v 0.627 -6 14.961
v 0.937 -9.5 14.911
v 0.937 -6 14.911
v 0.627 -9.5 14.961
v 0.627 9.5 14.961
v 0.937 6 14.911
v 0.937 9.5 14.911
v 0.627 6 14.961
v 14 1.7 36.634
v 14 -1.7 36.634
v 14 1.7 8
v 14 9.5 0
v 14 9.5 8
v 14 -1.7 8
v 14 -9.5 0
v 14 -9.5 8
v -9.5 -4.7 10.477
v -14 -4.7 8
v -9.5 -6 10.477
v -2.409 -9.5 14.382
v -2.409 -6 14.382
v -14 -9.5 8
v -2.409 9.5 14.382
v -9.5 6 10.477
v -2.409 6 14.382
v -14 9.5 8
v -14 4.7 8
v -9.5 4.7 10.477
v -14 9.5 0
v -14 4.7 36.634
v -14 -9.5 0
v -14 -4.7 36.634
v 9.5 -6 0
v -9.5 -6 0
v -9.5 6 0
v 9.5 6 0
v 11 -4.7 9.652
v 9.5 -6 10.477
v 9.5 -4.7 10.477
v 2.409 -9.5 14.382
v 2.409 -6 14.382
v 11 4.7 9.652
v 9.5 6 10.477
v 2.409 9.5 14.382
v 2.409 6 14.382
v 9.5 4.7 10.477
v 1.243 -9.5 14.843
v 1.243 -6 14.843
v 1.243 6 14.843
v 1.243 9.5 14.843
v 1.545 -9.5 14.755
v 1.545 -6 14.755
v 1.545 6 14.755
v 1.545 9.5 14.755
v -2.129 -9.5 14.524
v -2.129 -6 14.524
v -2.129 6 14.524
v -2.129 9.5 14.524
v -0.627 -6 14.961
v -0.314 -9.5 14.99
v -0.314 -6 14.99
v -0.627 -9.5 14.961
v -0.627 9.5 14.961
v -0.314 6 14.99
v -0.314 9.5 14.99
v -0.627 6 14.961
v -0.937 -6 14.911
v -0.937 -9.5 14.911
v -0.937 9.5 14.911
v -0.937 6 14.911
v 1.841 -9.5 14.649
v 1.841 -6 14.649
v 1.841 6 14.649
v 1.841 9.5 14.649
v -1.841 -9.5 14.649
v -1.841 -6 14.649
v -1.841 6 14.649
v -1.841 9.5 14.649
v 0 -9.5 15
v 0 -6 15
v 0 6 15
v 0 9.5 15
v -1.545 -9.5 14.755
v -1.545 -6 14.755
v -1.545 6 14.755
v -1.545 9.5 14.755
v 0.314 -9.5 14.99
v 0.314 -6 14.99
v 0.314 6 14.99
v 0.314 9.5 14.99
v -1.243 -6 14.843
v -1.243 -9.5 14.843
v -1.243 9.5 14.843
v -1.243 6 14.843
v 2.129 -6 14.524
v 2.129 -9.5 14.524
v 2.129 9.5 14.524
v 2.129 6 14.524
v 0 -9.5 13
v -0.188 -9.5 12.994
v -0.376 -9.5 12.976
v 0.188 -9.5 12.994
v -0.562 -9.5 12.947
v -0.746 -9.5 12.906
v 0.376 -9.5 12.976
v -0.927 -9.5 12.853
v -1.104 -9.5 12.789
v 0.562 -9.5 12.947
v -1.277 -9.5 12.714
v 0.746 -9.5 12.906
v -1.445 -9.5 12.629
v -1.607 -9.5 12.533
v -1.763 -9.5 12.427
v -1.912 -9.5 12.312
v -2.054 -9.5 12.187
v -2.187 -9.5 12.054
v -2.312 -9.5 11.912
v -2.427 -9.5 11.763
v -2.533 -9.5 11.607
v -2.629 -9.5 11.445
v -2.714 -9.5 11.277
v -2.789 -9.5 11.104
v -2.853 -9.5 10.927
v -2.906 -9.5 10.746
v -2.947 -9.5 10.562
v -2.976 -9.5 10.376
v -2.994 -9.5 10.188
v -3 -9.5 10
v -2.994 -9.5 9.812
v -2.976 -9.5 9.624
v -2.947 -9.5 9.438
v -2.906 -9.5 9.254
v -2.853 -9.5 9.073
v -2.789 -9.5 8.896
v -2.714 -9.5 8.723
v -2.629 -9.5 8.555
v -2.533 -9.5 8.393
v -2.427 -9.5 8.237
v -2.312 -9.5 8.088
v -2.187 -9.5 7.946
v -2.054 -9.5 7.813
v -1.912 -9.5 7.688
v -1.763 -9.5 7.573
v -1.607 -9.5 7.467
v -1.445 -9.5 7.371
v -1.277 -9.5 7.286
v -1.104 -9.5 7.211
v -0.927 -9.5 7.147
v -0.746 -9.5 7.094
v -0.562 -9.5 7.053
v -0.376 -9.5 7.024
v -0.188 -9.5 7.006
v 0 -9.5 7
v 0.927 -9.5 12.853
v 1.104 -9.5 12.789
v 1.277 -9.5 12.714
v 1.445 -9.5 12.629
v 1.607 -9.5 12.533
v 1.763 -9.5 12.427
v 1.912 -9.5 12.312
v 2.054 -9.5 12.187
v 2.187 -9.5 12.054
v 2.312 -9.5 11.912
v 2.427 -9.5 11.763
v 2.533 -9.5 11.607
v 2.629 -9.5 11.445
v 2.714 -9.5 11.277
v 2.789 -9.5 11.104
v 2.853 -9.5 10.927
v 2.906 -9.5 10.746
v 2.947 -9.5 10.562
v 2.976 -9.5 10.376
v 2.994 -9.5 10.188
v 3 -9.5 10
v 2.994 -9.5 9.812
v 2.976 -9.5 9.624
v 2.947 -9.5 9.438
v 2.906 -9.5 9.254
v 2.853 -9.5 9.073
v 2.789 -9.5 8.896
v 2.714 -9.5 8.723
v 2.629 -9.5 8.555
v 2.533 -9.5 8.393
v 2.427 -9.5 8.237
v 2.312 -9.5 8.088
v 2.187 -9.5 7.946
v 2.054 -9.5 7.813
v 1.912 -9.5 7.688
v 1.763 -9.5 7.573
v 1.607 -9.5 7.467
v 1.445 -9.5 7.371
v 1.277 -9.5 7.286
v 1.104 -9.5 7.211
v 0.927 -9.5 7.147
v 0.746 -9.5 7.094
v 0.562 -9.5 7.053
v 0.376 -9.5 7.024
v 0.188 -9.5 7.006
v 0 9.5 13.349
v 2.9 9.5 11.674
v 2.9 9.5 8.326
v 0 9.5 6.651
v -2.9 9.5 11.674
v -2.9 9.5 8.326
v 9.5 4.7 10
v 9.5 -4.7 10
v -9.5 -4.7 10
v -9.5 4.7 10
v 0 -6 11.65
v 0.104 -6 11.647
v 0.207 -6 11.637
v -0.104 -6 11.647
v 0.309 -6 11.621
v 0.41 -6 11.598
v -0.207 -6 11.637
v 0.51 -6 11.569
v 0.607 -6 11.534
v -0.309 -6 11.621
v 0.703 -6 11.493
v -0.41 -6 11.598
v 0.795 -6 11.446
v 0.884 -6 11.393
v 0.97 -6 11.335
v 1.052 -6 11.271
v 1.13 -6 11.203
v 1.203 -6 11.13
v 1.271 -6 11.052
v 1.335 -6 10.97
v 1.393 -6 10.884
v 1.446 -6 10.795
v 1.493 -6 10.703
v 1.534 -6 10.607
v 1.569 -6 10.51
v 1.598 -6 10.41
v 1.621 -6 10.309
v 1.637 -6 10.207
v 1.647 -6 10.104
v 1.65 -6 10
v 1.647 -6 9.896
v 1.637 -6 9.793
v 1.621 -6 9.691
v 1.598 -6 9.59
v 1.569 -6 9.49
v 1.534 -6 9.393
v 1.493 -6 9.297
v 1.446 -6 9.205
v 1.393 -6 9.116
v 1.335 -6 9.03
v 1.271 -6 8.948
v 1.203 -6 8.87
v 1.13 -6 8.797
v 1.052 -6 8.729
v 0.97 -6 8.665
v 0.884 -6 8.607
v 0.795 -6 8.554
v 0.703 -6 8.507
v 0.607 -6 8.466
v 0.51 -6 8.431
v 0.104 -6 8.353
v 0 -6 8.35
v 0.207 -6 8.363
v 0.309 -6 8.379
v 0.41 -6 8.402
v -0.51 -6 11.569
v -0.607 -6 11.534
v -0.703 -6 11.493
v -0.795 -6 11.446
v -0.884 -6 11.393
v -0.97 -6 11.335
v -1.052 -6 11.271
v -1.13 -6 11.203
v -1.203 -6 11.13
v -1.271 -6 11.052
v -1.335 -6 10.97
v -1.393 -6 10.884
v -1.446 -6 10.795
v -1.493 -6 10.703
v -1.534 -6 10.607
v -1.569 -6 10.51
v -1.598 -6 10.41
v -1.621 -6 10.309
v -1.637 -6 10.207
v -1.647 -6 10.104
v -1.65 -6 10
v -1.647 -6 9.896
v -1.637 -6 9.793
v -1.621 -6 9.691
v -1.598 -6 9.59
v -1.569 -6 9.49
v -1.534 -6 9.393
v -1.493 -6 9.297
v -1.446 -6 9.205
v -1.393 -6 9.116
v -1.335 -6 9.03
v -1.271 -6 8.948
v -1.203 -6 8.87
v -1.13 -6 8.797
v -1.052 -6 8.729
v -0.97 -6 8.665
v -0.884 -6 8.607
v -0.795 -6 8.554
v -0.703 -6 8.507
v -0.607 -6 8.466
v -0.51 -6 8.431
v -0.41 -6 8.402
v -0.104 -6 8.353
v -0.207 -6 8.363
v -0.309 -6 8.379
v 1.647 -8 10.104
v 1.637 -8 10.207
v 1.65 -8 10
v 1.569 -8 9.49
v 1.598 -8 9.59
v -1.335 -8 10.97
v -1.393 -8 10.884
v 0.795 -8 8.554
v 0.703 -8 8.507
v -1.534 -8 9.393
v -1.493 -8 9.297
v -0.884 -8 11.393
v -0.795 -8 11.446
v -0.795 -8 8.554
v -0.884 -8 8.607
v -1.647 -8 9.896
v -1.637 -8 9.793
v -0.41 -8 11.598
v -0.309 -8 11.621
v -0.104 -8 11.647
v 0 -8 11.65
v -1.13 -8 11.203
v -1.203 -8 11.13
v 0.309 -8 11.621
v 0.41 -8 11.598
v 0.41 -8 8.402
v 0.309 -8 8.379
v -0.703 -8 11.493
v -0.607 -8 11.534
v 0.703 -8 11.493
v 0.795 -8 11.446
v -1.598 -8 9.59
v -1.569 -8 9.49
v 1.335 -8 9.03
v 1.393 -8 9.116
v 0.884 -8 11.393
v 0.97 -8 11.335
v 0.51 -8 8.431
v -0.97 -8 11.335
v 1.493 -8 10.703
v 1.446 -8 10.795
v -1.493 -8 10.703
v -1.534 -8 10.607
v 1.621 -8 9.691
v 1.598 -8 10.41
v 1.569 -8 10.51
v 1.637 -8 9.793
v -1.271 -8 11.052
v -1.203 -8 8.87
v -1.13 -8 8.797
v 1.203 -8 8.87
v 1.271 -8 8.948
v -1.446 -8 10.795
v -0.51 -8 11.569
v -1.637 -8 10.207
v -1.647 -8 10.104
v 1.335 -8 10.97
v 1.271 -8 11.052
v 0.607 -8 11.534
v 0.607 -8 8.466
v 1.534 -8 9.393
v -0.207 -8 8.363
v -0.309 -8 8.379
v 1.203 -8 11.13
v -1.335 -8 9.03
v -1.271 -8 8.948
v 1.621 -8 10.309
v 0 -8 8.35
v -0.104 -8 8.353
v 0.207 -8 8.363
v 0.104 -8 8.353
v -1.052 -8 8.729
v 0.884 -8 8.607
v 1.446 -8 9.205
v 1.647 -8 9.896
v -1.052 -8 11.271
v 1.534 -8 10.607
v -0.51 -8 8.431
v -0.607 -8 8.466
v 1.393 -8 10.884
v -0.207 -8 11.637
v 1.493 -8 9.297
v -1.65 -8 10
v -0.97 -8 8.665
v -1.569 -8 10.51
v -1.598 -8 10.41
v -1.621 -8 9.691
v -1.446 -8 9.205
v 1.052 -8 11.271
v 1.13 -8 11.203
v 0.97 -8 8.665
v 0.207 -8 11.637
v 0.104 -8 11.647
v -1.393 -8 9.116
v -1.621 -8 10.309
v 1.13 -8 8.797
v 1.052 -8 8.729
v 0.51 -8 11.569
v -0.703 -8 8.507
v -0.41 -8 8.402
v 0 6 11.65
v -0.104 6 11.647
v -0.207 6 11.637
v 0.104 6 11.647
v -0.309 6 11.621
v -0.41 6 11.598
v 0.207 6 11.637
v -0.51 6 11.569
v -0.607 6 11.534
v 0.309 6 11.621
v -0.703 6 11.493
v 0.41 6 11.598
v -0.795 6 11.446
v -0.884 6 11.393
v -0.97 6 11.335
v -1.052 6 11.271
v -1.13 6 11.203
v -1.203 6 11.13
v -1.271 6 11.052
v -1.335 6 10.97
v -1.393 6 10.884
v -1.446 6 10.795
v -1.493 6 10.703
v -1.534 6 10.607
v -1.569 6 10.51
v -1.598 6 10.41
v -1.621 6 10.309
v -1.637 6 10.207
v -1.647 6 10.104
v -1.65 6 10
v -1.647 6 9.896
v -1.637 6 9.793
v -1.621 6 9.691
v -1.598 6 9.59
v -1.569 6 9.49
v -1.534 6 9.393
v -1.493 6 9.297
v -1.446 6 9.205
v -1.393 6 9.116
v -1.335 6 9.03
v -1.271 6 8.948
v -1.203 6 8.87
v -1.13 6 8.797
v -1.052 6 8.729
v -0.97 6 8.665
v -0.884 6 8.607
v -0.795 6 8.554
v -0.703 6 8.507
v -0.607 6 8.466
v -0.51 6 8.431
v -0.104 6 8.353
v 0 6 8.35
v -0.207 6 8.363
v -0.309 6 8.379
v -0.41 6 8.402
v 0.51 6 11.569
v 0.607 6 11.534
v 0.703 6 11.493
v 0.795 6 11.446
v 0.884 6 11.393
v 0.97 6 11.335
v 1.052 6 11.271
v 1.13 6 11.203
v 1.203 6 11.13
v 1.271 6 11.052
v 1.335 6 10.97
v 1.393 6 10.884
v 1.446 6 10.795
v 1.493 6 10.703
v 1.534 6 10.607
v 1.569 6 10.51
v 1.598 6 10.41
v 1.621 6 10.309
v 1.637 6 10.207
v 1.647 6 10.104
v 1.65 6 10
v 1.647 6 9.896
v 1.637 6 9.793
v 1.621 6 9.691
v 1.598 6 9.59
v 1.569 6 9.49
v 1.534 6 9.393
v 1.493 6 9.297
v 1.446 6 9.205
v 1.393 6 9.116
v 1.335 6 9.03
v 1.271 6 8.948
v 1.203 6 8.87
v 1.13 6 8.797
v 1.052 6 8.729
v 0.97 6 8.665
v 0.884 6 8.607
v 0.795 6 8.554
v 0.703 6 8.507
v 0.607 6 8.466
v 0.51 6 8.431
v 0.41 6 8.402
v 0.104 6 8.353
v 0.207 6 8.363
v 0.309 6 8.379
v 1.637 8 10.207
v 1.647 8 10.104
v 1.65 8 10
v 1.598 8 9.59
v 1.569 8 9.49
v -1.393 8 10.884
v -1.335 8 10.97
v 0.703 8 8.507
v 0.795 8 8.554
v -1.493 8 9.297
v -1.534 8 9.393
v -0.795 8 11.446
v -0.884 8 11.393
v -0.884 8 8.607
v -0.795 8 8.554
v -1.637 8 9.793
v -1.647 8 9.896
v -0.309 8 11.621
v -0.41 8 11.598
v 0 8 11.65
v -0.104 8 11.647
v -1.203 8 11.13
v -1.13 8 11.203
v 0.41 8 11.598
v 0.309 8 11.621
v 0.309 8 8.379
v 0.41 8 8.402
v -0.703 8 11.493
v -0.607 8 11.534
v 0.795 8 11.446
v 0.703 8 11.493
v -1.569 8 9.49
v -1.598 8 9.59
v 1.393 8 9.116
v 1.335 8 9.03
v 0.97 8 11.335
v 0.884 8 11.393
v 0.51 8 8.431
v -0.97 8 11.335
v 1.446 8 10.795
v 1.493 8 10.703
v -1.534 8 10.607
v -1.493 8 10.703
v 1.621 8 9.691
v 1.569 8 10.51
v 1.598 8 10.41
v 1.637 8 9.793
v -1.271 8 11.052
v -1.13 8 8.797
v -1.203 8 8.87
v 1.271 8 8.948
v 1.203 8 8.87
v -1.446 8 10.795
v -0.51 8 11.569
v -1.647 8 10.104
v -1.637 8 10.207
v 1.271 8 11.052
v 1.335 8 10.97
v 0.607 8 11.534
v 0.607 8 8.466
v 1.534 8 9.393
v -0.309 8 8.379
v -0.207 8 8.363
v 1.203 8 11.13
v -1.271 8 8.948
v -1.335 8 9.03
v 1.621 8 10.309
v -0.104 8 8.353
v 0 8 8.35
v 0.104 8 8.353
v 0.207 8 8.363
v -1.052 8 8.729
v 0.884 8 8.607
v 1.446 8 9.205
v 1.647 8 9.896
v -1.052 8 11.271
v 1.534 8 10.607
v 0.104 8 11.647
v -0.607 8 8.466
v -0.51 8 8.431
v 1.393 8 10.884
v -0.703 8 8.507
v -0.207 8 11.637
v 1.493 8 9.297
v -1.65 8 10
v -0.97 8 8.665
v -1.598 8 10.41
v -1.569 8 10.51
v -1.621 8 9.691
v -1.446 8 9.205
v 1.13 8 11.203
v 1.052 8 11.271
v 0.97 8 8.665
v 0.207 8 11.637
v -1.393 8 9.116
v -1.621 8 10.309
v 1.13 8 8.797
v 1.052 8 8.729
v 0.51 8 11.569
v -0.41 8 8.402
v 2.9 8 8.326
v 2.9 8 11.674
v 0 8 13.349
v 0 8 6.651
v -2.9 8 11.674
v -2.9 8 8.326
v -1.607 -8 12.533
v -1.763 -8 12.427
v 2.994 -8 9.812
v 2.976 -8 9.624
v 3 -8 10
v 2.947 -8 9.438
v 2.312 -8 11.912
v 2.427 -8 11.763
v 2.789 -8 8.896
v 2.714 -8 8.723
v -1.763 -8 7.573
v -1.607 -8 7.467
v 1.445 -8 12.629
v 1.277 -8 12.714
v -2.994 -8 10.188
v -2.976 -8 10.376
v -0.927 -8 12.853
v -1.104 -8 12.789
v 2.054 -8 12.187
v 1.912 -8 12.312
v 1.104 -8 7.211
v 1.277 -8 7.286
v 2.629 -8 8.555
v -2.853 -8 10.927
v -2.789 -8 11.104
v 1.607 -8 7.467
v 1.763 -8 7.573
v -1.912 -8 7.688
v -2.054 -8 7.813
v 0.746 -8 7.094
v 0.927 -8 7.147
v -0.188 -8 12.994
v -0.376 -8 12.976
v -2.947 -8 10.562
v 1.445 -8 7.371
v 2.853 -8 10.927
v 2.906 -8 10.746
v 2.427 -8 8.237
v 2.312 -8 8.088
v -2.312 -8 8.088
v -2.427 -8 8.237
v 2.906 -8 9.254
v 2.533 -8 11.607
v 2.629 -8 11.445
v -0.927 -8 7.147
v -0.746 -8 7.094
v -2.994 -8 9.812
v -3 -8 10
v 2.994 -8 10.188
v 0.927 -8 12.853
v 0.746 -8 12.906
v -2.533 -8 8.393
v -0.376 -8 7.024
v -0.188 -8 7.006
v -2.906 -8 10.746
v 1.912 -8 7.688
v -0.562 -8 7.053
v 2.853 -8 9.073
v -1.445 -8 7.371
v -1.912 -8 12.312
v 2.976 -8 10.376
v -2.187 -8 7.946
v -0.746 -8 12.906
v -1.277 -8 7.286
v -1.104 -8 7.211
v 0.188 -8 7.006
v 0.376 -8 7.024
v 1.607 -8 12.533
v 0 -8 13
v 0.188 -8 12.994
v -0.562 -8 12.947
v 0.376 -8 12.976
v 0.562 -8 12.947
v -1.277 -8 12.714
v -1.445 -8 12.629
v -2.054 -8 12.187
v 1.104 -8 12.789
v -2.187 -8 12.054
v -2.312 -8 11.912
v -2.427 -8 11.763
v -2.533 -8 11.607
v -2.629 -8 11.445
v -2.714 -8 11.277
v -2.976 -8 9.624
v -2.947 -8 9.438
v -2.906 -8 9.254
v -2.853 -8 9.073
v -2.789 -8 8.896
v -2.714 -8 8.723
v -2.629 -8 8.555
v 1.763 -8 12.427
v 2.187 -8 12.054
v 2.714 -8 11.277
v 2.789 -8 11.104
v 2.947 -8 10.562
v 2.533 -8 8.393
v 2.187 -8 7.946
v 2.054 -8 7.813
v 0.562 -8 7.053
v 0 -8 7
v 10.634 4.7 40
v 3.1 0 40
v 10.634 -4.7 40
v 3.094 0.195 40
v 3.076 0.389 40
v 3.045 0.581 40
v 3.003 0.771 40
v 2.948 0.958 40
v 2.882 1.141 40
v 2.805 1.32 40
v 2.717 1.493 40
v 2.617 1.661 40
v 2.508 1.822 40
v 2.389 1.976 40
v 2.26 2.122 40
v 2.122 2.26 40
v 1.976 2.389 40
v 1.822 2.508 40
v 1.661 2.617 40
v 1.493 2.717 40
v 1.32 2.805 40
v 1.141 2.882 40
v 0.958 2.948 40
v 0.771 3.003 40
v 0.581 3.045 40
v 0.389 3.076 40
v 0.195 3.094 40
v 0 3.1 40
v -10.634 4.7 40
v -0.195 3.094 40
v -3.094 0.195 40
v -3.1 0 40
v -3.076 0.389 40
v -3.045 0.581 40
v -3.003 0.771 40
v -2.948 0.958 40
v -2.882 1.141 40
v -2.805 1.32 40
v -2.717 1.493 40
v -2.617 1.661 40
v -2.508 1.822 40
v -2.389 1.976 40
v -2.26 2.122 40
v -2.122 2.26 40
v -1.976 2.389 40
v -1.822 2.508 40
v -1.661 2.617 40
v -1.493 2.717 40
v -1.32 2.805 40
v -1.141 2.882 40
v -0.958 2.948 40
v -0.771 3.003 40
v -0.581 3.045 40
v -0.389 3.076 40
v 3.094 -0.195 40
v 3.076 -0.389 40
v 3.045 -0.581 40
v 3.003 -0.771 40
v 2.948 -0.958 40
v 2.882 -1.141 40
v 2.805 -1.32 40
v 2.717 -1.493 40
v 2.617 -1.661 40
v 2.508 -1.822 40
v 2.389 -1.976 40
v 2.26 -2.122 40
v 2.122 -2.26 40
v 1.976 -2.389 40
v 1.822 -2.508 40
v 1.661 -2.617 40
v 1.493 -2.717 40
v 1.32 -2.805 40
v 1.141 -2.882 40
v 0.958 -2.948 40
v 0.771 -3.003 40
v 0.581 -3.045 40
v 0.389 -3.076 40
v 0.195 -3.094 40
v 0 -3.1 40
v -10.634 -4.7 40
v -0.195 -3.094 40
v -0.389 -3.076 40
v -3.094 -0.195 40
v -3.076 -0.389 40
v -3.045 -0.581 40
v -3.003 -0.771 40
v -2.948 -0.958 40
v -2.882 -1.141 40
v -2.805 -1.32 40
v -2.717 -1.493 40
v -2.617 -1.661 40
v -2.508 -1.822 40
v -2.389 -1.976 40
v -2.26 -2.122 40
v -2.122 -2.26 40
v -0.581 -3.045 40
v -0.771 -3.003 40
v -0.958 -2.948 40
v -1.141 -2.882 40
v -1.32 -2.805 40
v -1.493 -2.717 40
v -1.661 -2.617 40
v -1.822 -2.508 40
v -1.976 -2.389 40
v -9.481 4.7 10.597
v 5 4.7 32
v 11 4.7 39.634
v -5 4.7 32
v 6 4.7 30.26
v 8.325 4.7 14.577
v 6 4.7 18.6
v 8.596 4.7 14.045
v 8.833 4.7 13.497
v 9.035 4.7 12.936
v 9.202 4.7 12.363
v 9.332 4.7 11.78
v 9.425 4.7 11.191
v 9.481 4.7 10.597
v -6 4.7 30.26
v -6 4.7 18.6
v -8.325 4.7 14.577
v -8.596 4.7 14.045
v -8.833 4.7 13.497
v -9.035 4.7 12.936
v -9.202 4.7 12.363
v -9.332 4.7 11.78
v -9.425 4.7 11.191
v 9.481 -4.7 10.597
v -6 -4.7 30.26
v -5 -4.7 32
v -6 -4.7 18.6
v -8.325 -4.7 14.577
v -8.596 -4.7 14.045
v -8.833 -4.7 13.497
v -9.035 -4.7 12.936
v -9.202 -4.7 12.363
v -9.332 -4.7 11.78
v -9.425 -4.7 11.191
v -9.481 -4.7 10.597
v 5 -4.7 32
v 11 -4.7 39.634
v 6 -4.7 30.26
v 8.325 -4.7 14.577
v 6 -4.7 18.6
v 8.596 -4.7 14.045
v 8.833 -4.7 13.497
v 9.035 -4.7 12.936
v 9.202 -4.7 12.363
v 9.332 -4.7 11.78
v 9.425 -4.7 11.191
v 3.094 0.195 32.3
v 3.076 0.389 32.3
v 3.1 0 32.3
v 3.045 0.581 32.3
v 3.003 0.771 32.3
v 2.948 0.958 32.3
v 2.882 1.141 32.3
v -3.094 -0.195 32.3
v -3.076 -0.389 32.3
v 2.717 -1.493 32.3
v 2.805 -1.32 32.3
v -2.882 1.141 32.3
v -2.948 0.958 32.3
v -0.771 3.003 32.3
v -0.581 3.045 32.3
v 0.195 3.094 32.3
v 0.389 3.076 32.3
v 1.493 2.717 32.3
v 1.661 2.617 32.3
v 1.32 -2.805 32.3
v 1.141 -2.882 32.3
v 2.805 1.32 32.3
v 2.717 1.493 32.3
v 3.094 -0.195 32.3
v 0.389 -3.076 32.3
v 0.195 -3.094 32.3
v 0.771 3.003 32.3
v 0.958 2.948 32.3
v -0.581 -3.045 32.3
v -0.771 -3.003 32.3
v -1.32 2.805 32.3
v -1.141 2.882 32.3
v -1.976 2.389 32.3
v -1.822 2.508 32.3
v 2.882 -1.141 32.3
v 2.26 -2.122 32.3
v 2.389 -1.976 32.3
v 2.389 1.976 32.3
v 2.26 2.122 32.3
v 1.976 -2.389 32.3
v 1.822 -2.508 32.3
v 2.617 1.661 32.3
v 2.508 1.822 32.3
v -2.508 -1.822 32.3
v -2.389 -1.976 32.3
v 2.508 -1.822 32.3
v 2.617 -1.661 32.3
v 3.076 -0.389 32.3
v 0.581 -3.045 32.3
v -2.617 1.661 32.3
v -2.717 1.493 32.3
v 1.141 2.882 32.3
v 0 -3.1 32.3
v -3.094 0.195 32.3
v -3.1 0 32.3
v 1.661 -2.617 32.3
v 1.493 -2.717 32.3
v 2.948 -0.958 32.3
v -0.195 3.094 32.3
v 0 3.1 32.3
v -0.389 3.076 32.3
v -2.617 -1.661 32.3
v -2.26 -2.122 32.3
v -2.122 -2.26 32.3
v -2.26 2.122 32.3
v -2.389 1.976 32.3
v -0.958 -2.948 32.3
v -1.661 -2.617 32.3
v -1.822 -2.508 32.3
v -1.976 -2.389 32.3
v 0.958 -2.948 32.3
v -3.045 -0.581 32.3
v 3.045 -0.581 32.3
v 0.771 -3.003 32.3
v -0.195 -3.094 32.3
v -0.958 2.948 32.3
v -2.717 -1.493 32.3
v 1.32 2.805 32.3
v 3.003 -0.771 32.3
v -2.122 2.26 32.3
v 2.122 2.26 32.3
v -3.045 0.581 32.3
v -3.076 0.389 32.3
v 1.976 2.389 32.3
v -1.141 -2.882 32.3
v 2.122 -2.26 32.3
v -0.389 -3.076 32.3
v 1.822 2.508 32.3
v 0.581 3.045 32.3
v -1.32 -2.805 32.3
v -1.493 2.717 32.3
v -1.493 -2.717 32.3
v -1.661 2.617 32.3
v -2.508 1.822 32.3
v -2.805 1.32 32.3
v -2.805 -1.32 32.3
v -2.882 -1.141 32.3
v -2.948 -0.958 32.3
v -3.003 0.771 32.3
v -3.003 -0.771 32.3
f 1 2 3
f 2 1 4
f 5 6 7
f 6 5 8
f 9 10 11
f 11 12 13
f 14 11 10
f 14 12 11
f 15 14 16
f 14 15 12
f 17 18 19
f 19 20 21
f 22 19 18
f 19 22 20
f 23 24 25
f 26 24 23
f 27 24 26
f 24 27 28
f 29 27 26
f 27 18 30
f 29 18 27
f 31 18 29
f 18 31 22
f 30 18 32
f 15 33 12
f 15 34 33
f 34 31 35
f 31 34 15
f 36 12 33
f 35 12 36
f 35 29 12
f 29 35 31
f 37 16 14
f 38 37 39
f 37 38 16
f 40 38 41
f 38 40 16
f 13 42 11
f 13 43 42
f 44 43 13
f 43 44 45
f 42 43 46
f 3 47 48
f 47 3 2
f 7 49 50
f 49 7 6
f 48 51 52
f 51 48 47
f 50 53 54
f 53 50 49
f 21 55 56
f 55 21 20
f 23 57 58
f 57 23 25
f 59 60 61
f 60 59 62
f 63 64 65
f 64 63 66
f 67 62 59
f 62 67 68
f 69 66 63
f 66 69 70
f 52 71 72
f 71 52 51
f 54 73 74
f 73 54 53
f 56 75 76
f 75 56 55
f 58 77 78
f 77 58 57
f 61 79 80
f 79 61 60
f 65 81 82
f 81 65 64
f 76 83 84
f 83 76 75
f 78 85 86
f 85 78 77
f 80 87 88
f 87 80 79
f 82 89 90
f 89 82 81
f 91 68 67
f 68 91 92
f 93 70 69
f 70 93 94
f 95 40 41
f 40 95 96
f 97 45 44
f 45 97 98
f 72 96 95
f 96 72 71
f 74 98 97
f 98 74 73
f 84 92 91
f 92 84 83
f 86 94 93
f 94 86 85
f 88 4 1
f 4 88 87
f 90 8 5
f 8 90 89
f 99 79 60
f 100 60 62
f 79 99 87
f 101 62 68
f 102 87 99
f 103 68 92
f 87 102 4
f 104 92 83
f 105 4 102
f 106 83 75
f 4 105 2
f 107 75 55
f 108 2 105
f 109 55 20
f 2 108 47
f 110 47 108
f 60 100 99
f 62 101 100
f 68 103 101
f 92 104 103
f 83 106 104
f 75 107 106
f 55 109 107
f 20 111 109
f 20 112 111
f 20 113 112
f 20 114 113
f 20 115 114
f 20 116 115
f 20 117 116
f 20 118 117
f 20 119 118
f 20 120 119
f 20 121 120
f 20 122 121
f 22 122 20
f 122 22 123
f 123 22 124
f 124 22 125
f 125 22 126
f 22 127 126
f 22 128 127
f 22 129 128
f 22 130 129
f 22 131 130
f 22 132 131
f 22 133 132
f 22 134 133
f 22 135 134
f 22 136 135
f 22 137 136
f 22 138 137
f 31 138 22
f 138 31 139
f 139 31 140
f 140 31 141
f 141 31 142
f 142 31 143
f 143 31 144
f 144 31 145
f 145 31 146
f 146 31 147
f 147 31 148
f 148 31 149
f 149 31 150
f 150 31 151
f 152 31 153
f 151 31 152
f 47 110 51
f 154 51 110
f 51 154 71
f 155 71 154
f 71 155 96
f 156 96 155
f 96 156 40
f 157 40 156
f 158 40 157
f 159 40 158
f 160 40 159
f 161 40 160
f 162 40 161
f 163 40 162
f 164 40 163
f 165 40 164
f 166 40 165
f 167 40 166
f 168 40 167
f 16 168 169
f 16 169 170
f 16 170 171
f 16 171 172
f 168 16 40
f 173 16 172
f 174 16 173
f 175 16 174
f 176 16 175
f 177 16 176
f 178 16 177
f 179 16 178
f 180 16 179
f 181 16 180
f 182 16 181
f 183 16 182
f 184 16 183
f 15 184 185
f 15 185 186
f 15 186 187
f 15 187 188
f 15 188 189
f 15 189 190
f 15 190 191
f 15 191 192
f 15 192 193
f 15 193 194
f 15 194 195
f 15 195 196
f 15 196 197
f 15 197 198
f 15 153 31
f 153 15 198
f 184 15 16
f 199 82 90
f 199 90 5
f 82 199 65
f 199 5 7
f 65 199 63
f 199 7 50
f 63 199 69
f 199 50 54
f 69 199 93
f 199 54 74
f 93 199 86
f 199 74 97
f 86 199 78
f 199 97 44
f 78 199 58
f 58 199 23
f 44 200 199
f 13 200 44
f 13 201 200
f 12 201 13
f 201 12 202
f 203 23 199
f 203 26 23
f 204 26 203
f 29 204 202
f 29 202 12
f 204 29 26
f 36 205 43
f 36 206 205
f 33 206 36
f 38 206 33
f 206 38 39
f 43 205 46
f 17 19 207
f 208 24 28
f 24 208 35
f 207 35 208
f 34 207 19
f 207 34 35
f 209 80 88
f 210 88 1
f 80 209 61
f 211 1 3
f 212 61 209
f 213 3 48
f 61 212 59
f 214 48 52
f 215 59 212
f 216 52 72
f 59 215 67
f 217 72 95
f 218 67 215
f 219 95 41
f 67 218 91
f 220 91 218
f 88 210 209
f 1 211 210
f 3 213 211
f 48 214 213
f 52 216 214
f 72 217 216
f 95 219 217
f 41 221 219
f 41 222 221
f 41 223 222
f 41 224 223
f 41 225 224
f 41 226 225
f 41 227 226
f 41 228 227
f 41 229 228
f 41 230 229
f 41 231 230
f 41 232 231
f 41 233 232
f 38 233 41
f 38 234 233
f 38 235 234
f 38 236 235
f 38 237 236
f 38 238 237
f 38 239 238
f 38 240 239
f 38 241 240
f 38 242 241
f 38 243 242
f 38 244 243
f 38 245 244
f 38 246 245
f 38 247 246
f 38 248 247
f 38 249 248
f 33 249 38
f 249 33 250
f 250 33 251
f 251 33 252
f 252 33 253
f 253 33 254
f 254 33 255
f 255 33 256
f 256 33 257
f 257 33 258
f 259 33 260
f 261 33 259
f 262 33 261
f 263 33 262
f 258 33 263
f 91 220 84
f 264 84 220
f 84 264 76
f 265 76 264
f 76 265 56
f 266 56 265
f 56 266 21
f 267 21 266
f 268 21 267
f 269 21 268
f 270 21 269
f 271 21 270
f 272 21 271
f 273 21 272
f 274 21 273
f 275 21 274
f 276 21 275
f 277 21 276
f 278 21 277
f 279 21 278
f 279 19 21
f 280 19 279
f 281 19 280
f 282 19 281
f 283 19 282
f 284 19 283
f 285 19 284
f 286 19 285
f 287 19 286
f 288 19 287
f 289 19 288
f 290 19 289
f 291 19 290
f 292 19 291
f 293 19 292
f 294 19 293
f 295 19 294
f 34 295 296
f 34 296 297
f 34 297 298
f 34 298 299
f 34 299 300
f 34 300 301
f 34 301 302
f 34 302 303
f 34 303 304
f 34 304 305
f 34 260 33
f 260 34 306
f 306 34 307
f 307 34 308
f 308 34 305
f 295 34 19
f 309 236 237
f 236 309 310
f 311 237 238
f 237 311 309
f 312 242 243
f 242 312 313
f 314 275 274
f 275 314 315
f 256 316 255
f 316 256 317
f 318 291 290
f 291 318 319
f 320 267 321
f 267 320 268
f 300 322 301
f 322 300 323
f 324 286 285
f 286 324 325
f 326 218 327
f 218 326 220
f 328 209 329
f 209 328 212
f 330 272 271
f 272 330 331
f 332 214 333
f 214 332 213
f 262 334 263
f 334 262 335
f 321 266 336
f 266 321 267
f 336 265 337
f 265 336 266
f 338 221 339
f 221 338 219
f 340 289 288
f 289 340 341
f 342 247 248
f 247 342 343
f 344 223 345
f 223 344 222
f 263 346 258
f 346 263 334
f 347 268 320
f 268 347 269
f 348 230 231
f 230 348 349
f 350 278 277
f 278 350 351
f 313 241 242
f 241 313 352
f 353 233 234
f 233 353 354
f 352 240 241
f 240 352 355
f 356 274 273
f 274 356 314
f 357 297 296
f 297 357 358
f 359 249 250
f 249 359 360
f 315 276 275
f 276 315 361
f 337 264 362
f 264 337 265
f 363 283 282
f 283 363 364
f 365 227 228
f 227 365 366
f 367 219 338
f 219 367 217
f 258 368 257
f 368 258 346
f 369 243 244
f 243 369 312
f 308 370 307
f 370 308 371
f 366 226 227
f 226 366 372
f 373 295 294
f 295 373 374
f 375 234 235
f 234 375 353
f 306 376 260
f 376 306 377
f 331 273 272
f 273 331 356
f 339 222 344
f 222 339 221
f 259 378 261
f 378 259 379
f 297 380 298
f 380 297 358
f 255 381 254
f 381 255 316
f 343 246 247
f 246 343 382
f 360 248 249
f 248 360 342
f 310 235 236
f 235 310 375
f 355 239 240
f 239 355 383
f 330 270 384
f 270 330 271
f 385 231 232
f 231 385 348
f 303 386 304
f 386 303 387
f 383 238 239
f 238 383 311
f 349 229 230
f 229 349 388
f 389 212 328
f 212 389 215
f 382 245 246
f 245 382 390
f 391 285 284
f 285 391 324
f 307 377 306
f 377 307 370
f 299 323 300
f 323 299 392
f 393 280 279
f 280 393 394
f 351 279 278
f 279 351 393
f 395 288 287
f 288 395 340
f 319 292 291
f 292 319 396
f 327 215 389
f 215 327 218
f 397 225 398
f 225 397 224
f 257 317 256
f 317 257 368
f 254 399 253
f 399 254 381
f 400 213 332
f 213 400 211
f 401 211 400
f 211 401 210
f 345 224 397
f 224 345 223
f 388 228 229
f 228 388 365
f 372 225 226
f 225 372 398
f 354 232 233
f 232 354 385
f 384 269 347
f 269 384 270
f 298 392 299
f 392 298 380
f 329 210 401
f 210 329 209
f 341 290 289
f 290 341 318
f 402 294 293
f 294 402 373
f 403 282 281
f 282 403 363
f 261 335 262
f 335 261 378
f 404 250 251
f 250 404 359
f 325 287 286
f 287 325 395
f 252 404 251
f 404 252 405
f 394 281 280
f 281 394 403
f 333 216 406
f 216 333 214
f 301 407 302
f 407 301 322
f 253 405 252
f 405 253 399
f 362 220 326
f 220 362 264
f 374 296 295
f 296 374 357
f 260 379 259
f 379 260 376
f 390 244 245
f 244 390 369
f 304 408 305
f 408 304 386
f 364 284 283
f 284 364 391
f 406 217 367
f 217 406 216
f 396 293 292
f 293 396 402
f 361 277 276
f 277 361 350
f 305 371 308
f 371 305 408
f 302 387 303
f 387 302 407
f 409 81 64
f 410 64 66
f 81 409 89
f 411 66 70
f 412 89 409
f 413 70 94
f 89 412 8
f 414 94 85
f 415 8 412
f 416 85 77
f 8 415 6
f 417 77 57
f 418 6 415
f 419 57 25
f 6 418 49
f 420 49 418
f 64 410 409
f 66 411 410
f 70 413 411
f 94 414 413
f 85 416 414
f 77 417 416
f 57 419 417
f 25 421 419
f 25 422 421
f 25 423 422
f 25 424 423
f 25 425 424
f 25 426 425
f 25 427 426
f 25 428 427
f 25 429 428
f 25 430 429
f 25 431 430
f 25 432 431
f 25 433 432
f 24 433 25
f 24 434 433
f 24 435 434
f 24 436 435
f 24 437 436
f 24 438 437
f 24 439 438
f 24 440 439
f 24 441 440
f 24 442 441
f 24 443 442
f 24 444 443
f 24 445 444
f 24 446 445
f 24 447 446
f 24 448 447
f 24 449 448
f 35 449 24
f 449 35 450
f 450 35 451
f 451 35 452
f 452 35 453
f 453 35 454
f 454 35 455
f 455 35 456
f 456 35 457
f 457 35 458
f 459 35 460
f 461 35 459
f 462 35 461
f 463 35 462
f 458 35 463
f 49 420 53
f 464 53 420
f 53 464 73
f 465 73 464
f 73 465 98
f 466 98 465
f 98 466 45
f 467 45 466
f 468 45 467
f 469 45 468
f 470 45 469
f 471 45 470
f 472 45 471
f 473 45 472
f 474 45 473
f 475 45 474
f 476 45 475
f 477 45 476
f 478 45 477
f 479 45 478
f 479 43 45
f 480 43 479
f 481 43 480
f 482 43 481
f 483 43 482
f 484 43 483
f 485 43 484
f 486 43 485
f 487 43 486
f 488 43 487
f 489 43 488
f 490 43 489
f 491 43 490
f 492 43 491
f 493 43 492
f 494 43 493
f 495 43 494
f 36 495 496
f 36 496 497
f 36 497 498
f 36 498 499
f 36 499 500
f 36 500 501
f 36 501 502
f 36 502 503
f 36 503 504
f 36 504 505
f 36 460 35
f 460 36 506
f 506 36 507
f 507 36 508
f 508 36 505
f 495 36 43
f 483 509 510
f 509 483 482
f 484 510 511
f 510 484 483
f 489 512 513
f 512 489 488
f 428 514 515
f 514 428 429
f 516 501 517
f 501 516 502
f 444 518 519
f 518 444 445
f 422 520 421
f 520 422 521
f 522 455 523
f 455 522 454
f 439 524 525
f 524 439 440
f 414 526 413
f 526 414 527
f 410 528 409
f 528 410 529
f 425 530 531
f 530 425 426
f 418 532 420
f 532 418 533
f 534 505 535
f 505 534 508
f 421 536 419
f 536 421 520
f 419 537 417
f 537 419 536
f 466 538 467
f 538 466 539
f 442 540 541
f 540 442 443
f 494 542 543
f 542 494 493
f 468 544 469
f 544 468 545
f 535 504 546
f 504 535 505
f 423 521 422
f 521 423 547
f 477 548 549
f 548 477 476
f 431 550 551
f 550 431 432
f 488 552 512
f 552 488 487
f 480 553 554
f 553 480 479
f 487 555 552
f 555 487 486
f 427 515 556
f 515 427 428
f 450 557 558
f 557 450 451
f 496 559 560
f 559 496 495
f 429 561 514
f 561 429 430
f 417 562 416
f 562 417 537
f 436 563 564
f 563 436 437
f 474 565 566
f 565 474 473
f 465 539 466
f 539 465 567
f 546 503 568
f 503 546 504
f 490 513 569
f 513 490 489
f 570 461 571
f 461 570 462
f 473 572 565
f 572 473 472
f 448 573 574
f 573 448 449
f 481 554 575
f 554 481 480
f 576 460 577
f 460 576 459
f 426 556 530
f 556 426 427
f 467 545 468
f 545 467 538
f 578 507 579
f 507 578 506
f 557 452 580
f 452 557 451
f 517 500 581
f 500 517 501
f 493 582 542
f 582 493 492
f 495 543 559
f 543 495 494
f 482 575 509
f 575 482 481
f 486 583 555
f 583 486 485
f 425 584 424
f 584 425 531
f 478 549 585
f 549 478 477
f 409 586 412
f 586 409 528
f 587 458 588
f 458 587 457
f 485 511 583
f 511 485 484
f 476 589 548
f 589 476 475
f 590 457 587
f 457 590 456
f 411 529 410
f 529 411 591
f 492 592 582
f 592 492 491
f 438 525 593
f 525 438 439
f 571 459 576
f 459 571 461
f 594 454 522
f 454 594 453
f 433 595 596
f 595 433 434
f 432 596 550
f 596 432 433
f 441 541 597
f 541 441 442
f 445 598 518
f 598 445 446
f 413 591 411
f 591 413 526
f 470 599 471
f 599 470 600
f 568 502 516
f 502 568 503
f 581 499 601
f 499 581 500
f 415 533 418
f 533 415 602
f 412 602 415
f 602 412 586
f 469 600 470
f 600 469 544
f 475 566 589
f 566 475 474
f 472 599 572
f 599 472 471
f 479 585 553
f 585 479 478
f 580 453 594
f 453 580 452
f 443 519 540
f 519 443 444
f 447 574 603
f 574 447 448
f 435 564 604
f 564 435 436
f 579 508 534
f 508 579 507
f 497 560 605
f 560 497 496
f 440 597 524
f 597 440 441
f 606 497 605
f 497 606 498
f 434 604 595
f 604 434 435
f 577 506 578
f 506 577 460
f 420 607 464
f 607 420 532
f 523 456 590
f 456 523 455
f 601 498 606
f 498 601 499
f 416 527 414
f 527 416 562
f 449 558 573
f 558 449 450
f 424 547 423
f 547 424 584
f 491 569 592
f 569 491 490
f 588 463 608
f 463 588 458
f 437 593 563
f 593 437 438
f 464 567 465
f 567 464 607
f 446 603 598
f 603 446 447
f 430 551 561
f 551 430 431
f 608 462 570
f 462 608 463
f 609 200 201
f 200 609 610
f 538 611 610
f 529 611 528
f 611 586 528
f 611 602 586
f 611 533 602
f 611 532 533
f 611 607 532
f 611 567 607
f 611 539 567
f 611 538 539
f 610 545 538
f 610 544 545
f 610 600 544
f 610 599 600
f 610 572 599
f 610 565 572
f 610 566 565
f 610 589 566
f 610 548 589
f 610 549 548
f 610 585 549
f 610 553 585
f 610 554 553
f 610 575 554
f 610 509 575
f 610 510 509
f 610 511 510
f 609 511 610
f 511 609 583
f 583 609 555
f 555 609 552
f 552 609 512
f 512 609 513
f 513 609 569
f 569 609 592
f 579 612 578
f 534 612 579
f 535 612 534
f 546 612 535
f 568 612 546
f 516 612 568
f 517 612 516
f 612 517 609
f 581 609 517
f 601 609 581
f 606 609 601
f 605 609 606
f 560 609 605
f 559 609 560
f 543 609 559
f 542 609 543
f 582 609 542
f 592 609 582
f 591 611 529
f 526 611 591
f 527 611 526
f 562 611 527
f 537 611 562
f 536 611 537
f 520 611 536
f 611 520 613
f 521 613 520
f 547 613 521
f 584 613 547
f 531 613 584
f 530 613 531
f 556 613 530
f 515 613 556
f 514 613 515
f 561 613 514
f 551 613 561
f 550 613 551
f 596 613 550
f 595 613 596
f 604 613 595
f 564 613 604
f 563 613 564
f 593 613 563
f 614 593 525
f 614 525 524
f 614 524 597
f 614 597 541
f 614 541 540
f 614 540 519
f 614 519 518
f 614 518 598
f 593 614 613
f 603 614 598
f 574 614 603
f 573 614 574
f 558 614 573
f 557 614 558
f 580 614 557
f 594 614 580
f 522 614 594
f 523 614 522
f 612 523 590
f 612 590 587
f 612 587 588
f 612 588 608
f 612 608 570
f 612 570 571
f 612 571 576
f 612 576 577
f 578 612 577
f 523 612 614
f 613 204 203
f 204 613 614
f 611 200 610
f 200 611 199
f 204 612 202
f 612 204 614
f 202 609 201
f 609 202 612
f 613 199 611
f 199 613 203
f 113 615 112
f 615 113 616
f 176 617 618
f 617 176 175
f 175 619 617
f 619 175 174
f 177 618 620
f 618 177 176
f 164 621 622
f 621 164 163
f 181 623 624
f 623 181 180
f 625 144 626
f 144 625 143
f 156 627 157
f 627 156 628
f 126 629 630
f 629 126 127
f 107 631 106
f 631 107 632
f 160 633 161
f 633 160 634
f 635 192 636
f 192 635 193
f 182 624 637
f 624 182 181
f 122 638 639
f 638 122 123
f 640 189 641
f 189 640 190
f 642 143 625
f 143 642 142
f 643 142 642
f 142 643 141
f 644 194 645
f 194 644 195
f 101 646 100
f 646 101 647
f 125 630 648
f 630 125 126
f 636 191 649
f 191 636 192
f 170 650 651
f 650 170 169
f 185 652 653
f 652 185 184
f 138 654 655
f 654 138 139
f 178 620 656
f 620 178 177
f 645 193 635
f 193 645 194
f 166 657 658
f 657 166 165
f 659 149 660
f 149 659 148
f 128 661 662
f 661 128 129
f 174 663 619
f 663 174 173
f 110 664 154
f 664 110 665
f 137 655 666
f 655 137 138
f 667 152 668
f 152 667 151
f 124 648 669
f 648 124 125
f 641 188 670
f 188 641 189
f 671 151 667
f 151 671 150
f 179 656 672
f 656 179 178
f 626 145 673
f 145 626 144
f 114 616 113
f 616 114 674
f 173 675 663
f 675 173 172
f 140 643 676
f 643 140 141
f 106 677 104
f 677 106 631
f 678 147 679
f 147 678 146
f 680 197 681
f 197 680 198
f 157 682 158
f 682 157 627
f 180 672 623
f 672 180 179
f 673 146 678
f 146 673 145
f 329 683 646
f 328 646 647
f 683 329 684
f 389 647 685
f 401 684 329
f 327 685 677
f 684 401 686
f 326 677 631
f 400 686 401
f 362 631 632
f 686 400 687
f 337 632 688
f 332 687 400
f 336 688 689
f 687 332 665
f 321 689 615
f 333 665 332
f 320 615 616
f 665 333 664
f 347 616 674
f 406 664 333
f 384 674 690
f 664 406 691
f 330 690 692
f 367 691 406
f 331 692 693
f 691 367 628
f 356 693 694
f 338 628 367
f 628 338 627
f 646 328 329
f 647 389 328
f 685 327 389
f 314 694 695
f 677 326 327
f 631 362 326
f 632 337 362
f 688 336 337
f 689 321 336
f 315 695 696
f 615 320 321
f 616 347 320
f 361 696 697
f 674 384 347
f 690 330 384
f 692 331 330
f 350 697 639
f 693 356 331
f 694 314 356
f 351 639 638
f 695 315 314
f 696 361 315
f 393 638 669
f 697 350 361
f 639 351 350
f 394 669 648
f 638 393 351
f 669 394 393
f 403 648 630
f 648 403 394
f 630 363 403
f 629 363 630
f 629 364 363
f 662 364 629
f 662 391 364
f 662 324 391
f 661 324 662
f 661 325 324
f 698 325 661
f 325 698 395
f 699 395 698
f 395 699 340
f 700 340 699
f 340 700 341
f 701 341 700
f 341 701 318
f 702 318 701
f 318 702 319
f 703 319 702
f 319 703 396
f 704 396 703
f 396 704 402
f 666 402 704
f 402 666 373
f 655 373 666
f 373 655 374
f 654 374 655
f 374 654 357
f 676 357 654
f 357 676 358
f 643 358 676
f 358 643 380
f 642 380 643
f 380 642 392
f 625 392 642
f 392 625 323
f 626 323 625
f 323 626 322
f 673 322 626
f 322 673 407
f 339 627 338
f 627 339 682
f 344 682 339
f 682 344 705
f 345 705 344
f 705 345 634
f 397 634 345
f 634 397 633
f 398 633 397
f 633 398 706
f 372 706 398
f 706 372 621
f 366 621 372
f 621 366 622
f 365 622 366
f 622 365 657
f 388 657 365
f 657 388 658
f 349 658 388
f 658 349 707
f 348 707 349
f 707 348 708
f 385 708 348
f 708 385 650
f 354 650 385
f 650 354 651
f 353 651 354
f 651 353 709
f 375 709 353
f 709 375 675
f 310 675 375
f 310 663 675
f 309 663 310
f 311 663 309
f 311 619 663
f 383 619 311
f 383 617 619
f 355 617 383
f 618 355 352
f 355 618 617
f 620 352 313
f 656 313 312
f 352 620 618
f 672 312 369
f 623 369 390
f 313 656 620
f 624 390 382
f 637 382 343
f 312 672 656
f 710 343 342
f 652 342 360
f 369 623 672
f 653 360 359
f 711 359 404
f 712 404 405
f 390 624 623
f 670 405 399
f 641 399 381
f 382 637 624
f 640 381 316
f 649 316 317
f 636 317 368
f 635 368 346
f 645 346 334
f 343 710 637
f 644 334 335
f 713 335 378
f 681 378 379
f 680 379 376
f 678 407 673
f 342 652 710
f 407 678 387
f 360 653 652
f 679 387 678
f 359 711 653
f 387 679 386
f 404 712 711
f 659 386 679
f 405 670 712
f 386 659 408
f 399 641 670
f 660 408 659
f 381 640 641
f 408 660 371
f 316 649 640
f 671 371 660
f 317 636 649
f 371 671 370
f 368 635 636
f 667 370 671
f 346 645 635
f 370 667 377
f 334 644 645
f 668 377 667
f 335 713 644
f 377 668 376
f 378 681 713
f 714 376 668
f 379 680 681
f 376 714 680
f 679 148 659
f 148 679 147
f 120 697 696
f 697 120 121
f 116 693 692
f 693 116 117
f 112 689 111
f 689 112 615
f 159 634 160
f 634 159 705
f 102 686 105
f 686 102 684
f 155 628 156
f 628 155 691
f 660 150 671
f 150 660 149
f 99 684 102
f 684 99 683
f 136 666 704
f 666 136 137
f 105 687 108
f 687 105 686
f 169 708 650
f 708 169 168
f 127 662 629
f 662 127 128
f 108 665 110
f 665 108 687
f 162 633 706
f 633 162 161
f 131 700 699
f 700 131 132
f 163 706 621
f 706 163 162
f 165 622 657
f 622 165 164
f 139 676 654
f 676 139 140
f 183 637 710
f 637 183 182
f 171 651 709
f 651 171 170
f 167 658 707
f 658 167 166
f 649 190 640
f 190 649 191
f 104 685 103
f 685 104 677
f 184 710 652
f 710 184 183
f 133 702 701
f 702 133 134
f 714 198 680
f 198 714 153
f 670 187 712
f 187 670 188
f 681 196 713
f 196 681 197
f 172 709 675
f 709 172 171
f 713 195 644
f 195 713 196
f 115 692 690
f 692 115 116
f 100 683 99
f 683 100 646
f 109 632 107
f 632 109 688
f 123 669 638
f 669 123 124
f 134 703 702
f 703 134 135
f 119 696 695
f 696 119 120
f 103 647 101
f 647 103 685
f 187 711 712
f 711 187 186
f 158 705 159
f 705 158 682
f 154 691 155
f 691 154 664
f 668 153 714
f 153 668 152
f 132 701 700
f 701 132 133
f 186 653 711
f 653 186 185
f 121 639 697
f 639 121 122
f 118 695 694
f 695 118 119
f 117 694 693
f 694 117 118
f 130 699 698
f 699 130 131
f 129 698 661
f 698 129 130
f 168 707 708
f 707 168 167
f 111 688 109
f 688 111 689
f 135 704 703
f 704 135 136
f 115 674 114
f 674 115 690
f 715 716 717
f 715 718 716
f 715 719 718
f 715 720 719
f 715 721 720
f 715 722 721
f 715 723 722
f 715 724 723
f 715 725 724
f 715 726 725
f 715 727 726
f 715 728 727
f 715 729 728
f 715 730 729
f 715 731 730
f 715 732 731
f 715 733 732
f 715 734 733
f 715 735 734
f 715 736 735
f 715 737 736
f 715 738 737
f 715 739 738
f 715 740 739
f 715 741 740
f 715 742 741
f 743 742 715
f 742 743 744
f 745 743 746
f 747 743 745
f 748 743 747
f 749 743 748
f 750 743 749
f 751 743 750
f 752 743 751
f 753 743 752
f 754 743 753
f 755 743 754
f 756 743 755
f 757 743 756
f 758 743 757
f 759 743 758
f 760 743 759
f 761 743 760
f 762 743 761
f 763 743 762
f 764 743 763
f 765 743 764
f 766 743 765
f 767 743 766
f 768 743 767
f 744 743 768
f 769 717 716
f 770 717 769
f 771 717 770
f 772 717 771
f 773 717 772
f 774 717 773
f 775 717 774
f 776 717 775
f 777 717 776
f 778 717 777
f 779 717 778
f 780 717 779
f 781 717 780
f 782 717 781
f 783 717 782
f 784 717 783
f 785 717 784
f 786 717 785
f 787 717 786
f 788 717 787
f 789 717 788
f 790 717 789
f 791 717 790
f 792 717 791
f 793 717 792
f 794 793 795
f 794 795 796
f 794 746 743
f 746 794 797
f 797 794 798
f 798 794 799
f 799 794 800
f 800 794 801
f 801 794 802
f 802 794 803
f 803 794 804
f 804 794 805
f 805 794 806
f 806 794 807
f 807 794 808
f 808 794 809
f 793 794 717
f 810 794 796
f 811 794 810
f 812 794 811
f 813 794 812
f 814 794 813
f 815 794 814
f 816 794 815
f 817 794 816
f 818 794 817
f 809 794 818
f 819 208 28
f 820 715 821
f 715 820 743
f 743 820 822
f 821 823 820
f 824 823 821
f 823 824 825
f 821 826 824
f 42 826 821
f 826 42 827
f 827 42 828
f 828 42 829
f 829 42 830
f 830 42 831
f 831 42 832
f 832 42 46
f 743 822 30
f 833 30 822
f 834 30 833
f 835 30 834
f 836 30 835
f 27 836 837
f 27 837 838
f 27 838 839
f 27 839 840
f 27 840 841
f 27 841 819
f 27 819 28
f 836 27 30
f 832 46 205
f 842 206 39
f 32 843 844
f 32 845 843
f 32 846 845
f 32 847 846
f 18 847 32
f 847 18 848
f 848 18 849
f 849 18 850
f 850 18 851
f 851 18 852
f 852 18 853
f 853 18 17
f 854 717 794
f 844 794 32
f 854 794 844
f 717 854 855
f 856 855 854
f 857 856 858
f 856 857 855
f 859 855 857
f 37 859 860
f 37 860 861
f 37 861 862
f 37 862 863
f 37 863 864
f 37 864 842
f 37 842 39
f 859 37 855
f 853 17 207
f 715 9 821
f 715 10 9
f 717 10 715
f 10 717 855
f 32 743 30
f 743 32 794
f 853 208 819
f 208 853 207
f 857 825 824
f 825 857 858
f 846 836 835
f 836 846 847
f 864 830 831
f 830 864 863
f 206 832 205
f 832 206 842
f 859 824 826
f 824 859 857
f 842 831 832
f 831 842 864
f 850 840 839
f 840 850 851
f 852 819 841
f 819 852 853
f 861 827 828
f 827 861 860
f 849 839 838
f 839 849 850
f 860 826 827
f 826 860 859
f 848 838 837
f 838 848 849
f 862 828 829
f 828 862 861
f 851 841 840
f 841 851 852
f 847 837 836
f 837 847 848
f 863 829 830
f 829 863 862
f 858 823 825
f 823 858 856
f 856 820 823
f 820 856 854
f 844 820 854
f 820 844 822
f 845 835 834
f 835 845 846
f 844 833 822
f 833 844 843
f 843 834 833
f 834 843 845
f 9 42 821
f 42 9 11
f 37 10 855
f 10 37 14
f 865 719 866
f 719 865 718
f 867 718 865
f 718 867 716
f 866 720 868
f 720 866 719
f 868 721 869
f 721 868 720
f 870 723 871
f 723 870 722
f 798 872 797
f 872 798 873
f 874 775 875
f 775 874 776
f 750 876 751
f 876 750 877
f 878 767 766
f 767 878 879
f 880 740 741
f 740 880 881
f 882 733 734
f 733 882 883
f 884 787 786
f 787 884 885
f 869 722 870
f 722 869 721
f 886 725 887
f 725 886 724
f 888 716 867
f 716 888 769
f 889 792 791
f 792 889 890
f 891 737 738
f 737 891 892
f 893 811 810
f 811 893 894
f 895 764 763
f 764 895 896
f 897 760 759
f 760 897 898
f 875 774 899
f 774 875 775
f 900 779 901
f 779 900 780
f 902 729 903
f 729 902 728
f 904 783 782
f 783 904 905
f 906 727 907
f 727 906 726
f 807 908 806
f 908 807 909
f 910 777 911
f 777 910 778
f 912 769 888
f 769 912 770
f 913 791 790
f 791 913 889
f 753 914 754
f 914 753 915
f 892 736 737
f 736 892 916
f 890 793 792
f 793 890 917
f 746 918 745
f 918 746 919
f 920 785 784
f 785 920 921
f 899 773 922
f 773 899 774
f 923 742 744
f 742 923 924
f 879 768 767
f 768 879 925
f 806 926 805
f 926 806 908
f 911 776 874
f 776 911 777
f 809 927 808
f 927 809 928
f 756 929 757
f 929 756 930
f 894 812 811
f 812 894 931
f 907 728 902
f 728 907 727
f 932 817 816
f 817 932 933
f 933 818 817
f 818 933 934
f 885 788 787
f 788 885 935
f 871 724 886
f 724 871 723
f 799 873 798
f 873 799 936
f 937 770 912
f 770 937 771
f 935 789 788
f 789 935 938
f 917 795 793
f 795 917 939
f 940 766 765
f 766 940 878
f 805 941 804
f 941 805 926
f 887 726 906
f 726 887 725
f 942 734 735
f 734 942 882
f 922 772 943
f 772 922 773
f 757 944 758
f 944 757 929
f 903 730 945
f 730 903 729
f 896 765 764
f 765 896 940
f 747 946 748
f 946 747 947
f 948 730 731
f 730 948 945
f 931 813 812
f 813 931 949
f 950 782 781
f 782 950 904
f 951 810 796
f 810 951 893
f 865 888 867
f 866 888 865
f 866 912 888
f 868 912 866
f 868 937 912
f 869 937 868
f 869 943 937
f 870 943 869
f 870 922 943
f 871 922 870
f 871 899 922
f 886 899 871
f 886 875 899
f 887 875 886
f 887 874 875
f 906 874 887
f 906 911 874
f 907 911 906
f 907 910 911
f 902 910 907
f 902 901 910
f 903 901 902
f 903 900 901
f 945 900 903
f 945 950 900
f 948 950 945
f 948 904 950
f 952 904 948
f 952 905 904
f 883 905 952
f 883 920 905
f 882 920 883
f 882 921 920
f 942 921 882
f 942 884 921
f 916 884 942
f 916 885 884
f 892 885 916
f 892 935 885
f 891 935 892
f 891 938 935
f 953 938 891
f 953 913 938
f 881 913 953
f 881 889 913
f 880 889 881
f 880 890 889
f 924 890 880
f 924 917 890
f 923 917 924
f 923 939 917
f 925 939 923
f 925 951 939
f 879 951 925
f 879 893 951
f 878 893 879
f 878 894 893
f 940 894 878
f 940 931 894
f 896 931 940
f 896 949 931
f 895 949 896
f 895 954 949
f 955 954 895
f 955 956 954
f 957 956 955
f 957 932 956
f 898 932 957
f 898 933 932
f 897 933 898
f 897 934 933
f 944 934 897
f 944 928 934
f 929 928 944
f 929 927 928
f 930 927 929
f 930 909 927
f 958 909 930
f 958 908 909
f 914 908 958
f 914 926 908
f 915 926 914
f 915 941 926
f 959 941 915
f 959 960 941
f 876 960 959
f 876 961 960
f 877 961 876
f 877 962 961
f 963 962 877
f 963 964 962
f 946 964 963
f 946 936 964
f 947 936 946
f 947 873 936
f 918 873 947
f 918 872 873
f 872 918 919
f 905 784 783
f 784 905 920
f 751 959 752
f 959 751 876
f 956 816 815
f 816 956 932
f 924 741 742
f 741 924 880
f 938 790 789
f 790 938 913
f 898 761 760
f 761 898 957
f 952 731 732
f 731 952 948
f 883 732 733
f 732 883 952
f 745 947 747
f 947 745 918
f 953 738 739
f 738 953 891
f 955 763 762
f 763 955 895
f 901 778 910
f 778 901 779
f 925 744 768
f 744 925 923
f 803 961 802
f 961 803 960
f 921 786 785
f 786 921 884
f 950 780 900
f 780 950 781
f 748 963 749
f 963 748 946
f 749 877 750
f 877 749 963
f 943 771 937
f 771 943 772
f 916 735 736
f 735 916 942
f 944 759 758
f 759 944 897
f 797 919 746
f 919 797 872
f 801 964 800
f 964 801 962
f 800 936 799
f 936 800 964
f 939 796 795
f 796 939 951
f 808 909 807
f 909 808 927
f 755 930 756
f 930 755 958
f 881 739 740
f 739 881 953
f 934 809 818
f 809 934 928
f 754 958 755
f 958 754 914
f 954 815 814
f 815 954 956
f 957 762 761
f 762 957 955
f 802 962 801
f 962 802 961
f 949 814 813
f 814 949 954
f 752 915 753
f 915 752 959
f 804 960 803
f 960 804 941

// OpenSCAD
// file: Code_Config.scad
// Global configuration file of PowerCode
// By J.Rodigo (www.jra.so)
// Licence Creative commons atribution & share alike.
// Author: Mecano ( https://github.com/Mecan0/Code )

//************************************//
// Parámetros de configuración global //
//************************************//

$fn = 100;

// Cojinetes Lineales
dCoLi = 16.2 ;	// Diámetro

// Varillas lisas
dVaLi = 8.15 ; // Diámetro


//************************************//
//        Módulos de uso global       //
//************************************//

// Generar un hexágono circunscrito (Diámetro,altura) 
module hexagono(d,h){ 
	for (a = [0, 60,120]){ 
		rotate( a, [0, 0, 1])
		cube([d, d*tan(30), h], center = true);
	}
}

// Generar un cuadrado/chaflán a 45º (Arista,Altura,Giro{0 = 45º, 1 = 135º, ...}) 
module chamfer(a,h,g){ 
	rotate( g*90 + 45 , [0, 0, 1])
	cube([a, a, h]);
}
// main file
// Created from Code_Xend_Idler_B_623_M6.stl
// https://github.com/Mecan0/Code
// By J.Rodigo (www.jra.so)
// Licence Creative commons atribution & share alike.

include <Code_Config.scad>;

/**************************/
// Parámetros de la pieza  /
/**************************/

dTor = 6.2 ; 	// Diámetro del tornillo del tensor (6.2)

// Los dos taladros del soporte para el tornillo de la polea
dToSo = 3.3 ;	// Diámetro del taladro (3.3)
dToCh = 6 ; 	// Diámetro del zócalo (6)
dToTu = 5.8 ; 	// Tamaño de la tuerca (5.8)

// Creamos la mitad de la base
module mbase(){
	// Redondeo y chaflan mediante el comando hull
	hull(){
		// Bloque de la base
		translate([-14, -9.5, 0])
		cube([28, 9.5, 8]);
		// Redondeo superior 
		translate([0, 0, 10])
		rotate( 90, [1, 0, 0])
		cylinder(h = 9.5, r = 5);	
	}
}

// Operaciones para la media base
module mbaseope(){
	// Vaciado interior
	translate([-9.5, -6, -1])
	cube([19, 7, 17]);
	// Taladro para el tornillo
	translate([0, -5, 10])
	rotate( 90, [1, 0, 0])
	cylinder(h = 5, r = dToSo/2);
}

// Base de la pieza
module base(){
	difference(){
		union(){
			// Media base en -Y 
			mbase();
			// Media base en +Y
			mirror([ 0, 1, 0 ])
			mbase();
		}
		union(){
			// Media parte de las operaciones en -Y 
			mbaseope();
			// Media parte de las operaciones en +Y 
			mirror([ 0, 1, 0 ])
			mbaseope();
			// Zócalo para la cabeza del tornillo
			translate([0, 9.5, 10])
			rotate( 90, [1, 0, 0])
			hexagono(dToTu,3);
			// Zócalo para la tuerca
			translate([0, -10, 10])
			rotate( -90, [1, 0, 0])
			cylinder(h = 2, r = dToCh/2);
		}
	}
}

// Medio soporte
module msoporte(){
	difference(){
		// Bloque principal del soporte
		translate([0, -4.7, 0])
		cube([14, 9.4, 40]);
		// Chaflán superior del soporte
		translate([10.634, -6, 40])
		rotate( 45 , [0, 1, 0])
		cube([5, 12, 5]);
	}
}

module msoporteope(){
	// Parte inferior redondeada
	hull(){
		// Bloque inferior
		translate([-1, -6, -1])
		cube([10.5, 12, 10]);
		// Redondeo interior 
		translate([0, 6, 10])
		rotate( 90, [1, 0, 0])
		cylinder(h = 12, r = 9.5);	
		// Bloque del medio
		translate([-1, -6, 17.6])
		cube([7, 12, 1]);
	}
	// Parte superior con chaflán
	hull(){
		// Bloque del medio
		translate([-1, -6, -1])
		cube([7, 12, 31.26]);
		// Bloque superior
		translate([-1, -6, 31])
		cube([6, 12, 1]);
	}
	
}

// Base de la pieza
module soporte(){
	difference(){
		union(){
			// Medio soporte en +X 
			msoporte();
			// Medio soporte en -X 
			mirror([ 1, 0, 0 ])
			msoporte();
		}
		union(){
			// Media parte de las operaciones en +X
			msoporteope();
			// Chaflanes a lo largo del eje Z
			translate([14, 1.7, 0])
			chamfer(5,41,0);
			translate([14, -1.7, 0])
			chamfer(5,41,2);
			// Media parte de las operaciones en -X 
			mirror([ 1, 0, 0 ])
			msoporteope();
			// Taladro superior para el tensado
			translate([0, 0, 32 + 0.3]) // Se añade un 0.3 para poder imprimir el puente
			cylinder(h = 10, r = dTor/2);
		}
	}
}

// Unimos la base y el soporte para crear la pieza
module pieza(){
	base();
	soporte();
}

// Generamos la pieza!!

	pieza();
